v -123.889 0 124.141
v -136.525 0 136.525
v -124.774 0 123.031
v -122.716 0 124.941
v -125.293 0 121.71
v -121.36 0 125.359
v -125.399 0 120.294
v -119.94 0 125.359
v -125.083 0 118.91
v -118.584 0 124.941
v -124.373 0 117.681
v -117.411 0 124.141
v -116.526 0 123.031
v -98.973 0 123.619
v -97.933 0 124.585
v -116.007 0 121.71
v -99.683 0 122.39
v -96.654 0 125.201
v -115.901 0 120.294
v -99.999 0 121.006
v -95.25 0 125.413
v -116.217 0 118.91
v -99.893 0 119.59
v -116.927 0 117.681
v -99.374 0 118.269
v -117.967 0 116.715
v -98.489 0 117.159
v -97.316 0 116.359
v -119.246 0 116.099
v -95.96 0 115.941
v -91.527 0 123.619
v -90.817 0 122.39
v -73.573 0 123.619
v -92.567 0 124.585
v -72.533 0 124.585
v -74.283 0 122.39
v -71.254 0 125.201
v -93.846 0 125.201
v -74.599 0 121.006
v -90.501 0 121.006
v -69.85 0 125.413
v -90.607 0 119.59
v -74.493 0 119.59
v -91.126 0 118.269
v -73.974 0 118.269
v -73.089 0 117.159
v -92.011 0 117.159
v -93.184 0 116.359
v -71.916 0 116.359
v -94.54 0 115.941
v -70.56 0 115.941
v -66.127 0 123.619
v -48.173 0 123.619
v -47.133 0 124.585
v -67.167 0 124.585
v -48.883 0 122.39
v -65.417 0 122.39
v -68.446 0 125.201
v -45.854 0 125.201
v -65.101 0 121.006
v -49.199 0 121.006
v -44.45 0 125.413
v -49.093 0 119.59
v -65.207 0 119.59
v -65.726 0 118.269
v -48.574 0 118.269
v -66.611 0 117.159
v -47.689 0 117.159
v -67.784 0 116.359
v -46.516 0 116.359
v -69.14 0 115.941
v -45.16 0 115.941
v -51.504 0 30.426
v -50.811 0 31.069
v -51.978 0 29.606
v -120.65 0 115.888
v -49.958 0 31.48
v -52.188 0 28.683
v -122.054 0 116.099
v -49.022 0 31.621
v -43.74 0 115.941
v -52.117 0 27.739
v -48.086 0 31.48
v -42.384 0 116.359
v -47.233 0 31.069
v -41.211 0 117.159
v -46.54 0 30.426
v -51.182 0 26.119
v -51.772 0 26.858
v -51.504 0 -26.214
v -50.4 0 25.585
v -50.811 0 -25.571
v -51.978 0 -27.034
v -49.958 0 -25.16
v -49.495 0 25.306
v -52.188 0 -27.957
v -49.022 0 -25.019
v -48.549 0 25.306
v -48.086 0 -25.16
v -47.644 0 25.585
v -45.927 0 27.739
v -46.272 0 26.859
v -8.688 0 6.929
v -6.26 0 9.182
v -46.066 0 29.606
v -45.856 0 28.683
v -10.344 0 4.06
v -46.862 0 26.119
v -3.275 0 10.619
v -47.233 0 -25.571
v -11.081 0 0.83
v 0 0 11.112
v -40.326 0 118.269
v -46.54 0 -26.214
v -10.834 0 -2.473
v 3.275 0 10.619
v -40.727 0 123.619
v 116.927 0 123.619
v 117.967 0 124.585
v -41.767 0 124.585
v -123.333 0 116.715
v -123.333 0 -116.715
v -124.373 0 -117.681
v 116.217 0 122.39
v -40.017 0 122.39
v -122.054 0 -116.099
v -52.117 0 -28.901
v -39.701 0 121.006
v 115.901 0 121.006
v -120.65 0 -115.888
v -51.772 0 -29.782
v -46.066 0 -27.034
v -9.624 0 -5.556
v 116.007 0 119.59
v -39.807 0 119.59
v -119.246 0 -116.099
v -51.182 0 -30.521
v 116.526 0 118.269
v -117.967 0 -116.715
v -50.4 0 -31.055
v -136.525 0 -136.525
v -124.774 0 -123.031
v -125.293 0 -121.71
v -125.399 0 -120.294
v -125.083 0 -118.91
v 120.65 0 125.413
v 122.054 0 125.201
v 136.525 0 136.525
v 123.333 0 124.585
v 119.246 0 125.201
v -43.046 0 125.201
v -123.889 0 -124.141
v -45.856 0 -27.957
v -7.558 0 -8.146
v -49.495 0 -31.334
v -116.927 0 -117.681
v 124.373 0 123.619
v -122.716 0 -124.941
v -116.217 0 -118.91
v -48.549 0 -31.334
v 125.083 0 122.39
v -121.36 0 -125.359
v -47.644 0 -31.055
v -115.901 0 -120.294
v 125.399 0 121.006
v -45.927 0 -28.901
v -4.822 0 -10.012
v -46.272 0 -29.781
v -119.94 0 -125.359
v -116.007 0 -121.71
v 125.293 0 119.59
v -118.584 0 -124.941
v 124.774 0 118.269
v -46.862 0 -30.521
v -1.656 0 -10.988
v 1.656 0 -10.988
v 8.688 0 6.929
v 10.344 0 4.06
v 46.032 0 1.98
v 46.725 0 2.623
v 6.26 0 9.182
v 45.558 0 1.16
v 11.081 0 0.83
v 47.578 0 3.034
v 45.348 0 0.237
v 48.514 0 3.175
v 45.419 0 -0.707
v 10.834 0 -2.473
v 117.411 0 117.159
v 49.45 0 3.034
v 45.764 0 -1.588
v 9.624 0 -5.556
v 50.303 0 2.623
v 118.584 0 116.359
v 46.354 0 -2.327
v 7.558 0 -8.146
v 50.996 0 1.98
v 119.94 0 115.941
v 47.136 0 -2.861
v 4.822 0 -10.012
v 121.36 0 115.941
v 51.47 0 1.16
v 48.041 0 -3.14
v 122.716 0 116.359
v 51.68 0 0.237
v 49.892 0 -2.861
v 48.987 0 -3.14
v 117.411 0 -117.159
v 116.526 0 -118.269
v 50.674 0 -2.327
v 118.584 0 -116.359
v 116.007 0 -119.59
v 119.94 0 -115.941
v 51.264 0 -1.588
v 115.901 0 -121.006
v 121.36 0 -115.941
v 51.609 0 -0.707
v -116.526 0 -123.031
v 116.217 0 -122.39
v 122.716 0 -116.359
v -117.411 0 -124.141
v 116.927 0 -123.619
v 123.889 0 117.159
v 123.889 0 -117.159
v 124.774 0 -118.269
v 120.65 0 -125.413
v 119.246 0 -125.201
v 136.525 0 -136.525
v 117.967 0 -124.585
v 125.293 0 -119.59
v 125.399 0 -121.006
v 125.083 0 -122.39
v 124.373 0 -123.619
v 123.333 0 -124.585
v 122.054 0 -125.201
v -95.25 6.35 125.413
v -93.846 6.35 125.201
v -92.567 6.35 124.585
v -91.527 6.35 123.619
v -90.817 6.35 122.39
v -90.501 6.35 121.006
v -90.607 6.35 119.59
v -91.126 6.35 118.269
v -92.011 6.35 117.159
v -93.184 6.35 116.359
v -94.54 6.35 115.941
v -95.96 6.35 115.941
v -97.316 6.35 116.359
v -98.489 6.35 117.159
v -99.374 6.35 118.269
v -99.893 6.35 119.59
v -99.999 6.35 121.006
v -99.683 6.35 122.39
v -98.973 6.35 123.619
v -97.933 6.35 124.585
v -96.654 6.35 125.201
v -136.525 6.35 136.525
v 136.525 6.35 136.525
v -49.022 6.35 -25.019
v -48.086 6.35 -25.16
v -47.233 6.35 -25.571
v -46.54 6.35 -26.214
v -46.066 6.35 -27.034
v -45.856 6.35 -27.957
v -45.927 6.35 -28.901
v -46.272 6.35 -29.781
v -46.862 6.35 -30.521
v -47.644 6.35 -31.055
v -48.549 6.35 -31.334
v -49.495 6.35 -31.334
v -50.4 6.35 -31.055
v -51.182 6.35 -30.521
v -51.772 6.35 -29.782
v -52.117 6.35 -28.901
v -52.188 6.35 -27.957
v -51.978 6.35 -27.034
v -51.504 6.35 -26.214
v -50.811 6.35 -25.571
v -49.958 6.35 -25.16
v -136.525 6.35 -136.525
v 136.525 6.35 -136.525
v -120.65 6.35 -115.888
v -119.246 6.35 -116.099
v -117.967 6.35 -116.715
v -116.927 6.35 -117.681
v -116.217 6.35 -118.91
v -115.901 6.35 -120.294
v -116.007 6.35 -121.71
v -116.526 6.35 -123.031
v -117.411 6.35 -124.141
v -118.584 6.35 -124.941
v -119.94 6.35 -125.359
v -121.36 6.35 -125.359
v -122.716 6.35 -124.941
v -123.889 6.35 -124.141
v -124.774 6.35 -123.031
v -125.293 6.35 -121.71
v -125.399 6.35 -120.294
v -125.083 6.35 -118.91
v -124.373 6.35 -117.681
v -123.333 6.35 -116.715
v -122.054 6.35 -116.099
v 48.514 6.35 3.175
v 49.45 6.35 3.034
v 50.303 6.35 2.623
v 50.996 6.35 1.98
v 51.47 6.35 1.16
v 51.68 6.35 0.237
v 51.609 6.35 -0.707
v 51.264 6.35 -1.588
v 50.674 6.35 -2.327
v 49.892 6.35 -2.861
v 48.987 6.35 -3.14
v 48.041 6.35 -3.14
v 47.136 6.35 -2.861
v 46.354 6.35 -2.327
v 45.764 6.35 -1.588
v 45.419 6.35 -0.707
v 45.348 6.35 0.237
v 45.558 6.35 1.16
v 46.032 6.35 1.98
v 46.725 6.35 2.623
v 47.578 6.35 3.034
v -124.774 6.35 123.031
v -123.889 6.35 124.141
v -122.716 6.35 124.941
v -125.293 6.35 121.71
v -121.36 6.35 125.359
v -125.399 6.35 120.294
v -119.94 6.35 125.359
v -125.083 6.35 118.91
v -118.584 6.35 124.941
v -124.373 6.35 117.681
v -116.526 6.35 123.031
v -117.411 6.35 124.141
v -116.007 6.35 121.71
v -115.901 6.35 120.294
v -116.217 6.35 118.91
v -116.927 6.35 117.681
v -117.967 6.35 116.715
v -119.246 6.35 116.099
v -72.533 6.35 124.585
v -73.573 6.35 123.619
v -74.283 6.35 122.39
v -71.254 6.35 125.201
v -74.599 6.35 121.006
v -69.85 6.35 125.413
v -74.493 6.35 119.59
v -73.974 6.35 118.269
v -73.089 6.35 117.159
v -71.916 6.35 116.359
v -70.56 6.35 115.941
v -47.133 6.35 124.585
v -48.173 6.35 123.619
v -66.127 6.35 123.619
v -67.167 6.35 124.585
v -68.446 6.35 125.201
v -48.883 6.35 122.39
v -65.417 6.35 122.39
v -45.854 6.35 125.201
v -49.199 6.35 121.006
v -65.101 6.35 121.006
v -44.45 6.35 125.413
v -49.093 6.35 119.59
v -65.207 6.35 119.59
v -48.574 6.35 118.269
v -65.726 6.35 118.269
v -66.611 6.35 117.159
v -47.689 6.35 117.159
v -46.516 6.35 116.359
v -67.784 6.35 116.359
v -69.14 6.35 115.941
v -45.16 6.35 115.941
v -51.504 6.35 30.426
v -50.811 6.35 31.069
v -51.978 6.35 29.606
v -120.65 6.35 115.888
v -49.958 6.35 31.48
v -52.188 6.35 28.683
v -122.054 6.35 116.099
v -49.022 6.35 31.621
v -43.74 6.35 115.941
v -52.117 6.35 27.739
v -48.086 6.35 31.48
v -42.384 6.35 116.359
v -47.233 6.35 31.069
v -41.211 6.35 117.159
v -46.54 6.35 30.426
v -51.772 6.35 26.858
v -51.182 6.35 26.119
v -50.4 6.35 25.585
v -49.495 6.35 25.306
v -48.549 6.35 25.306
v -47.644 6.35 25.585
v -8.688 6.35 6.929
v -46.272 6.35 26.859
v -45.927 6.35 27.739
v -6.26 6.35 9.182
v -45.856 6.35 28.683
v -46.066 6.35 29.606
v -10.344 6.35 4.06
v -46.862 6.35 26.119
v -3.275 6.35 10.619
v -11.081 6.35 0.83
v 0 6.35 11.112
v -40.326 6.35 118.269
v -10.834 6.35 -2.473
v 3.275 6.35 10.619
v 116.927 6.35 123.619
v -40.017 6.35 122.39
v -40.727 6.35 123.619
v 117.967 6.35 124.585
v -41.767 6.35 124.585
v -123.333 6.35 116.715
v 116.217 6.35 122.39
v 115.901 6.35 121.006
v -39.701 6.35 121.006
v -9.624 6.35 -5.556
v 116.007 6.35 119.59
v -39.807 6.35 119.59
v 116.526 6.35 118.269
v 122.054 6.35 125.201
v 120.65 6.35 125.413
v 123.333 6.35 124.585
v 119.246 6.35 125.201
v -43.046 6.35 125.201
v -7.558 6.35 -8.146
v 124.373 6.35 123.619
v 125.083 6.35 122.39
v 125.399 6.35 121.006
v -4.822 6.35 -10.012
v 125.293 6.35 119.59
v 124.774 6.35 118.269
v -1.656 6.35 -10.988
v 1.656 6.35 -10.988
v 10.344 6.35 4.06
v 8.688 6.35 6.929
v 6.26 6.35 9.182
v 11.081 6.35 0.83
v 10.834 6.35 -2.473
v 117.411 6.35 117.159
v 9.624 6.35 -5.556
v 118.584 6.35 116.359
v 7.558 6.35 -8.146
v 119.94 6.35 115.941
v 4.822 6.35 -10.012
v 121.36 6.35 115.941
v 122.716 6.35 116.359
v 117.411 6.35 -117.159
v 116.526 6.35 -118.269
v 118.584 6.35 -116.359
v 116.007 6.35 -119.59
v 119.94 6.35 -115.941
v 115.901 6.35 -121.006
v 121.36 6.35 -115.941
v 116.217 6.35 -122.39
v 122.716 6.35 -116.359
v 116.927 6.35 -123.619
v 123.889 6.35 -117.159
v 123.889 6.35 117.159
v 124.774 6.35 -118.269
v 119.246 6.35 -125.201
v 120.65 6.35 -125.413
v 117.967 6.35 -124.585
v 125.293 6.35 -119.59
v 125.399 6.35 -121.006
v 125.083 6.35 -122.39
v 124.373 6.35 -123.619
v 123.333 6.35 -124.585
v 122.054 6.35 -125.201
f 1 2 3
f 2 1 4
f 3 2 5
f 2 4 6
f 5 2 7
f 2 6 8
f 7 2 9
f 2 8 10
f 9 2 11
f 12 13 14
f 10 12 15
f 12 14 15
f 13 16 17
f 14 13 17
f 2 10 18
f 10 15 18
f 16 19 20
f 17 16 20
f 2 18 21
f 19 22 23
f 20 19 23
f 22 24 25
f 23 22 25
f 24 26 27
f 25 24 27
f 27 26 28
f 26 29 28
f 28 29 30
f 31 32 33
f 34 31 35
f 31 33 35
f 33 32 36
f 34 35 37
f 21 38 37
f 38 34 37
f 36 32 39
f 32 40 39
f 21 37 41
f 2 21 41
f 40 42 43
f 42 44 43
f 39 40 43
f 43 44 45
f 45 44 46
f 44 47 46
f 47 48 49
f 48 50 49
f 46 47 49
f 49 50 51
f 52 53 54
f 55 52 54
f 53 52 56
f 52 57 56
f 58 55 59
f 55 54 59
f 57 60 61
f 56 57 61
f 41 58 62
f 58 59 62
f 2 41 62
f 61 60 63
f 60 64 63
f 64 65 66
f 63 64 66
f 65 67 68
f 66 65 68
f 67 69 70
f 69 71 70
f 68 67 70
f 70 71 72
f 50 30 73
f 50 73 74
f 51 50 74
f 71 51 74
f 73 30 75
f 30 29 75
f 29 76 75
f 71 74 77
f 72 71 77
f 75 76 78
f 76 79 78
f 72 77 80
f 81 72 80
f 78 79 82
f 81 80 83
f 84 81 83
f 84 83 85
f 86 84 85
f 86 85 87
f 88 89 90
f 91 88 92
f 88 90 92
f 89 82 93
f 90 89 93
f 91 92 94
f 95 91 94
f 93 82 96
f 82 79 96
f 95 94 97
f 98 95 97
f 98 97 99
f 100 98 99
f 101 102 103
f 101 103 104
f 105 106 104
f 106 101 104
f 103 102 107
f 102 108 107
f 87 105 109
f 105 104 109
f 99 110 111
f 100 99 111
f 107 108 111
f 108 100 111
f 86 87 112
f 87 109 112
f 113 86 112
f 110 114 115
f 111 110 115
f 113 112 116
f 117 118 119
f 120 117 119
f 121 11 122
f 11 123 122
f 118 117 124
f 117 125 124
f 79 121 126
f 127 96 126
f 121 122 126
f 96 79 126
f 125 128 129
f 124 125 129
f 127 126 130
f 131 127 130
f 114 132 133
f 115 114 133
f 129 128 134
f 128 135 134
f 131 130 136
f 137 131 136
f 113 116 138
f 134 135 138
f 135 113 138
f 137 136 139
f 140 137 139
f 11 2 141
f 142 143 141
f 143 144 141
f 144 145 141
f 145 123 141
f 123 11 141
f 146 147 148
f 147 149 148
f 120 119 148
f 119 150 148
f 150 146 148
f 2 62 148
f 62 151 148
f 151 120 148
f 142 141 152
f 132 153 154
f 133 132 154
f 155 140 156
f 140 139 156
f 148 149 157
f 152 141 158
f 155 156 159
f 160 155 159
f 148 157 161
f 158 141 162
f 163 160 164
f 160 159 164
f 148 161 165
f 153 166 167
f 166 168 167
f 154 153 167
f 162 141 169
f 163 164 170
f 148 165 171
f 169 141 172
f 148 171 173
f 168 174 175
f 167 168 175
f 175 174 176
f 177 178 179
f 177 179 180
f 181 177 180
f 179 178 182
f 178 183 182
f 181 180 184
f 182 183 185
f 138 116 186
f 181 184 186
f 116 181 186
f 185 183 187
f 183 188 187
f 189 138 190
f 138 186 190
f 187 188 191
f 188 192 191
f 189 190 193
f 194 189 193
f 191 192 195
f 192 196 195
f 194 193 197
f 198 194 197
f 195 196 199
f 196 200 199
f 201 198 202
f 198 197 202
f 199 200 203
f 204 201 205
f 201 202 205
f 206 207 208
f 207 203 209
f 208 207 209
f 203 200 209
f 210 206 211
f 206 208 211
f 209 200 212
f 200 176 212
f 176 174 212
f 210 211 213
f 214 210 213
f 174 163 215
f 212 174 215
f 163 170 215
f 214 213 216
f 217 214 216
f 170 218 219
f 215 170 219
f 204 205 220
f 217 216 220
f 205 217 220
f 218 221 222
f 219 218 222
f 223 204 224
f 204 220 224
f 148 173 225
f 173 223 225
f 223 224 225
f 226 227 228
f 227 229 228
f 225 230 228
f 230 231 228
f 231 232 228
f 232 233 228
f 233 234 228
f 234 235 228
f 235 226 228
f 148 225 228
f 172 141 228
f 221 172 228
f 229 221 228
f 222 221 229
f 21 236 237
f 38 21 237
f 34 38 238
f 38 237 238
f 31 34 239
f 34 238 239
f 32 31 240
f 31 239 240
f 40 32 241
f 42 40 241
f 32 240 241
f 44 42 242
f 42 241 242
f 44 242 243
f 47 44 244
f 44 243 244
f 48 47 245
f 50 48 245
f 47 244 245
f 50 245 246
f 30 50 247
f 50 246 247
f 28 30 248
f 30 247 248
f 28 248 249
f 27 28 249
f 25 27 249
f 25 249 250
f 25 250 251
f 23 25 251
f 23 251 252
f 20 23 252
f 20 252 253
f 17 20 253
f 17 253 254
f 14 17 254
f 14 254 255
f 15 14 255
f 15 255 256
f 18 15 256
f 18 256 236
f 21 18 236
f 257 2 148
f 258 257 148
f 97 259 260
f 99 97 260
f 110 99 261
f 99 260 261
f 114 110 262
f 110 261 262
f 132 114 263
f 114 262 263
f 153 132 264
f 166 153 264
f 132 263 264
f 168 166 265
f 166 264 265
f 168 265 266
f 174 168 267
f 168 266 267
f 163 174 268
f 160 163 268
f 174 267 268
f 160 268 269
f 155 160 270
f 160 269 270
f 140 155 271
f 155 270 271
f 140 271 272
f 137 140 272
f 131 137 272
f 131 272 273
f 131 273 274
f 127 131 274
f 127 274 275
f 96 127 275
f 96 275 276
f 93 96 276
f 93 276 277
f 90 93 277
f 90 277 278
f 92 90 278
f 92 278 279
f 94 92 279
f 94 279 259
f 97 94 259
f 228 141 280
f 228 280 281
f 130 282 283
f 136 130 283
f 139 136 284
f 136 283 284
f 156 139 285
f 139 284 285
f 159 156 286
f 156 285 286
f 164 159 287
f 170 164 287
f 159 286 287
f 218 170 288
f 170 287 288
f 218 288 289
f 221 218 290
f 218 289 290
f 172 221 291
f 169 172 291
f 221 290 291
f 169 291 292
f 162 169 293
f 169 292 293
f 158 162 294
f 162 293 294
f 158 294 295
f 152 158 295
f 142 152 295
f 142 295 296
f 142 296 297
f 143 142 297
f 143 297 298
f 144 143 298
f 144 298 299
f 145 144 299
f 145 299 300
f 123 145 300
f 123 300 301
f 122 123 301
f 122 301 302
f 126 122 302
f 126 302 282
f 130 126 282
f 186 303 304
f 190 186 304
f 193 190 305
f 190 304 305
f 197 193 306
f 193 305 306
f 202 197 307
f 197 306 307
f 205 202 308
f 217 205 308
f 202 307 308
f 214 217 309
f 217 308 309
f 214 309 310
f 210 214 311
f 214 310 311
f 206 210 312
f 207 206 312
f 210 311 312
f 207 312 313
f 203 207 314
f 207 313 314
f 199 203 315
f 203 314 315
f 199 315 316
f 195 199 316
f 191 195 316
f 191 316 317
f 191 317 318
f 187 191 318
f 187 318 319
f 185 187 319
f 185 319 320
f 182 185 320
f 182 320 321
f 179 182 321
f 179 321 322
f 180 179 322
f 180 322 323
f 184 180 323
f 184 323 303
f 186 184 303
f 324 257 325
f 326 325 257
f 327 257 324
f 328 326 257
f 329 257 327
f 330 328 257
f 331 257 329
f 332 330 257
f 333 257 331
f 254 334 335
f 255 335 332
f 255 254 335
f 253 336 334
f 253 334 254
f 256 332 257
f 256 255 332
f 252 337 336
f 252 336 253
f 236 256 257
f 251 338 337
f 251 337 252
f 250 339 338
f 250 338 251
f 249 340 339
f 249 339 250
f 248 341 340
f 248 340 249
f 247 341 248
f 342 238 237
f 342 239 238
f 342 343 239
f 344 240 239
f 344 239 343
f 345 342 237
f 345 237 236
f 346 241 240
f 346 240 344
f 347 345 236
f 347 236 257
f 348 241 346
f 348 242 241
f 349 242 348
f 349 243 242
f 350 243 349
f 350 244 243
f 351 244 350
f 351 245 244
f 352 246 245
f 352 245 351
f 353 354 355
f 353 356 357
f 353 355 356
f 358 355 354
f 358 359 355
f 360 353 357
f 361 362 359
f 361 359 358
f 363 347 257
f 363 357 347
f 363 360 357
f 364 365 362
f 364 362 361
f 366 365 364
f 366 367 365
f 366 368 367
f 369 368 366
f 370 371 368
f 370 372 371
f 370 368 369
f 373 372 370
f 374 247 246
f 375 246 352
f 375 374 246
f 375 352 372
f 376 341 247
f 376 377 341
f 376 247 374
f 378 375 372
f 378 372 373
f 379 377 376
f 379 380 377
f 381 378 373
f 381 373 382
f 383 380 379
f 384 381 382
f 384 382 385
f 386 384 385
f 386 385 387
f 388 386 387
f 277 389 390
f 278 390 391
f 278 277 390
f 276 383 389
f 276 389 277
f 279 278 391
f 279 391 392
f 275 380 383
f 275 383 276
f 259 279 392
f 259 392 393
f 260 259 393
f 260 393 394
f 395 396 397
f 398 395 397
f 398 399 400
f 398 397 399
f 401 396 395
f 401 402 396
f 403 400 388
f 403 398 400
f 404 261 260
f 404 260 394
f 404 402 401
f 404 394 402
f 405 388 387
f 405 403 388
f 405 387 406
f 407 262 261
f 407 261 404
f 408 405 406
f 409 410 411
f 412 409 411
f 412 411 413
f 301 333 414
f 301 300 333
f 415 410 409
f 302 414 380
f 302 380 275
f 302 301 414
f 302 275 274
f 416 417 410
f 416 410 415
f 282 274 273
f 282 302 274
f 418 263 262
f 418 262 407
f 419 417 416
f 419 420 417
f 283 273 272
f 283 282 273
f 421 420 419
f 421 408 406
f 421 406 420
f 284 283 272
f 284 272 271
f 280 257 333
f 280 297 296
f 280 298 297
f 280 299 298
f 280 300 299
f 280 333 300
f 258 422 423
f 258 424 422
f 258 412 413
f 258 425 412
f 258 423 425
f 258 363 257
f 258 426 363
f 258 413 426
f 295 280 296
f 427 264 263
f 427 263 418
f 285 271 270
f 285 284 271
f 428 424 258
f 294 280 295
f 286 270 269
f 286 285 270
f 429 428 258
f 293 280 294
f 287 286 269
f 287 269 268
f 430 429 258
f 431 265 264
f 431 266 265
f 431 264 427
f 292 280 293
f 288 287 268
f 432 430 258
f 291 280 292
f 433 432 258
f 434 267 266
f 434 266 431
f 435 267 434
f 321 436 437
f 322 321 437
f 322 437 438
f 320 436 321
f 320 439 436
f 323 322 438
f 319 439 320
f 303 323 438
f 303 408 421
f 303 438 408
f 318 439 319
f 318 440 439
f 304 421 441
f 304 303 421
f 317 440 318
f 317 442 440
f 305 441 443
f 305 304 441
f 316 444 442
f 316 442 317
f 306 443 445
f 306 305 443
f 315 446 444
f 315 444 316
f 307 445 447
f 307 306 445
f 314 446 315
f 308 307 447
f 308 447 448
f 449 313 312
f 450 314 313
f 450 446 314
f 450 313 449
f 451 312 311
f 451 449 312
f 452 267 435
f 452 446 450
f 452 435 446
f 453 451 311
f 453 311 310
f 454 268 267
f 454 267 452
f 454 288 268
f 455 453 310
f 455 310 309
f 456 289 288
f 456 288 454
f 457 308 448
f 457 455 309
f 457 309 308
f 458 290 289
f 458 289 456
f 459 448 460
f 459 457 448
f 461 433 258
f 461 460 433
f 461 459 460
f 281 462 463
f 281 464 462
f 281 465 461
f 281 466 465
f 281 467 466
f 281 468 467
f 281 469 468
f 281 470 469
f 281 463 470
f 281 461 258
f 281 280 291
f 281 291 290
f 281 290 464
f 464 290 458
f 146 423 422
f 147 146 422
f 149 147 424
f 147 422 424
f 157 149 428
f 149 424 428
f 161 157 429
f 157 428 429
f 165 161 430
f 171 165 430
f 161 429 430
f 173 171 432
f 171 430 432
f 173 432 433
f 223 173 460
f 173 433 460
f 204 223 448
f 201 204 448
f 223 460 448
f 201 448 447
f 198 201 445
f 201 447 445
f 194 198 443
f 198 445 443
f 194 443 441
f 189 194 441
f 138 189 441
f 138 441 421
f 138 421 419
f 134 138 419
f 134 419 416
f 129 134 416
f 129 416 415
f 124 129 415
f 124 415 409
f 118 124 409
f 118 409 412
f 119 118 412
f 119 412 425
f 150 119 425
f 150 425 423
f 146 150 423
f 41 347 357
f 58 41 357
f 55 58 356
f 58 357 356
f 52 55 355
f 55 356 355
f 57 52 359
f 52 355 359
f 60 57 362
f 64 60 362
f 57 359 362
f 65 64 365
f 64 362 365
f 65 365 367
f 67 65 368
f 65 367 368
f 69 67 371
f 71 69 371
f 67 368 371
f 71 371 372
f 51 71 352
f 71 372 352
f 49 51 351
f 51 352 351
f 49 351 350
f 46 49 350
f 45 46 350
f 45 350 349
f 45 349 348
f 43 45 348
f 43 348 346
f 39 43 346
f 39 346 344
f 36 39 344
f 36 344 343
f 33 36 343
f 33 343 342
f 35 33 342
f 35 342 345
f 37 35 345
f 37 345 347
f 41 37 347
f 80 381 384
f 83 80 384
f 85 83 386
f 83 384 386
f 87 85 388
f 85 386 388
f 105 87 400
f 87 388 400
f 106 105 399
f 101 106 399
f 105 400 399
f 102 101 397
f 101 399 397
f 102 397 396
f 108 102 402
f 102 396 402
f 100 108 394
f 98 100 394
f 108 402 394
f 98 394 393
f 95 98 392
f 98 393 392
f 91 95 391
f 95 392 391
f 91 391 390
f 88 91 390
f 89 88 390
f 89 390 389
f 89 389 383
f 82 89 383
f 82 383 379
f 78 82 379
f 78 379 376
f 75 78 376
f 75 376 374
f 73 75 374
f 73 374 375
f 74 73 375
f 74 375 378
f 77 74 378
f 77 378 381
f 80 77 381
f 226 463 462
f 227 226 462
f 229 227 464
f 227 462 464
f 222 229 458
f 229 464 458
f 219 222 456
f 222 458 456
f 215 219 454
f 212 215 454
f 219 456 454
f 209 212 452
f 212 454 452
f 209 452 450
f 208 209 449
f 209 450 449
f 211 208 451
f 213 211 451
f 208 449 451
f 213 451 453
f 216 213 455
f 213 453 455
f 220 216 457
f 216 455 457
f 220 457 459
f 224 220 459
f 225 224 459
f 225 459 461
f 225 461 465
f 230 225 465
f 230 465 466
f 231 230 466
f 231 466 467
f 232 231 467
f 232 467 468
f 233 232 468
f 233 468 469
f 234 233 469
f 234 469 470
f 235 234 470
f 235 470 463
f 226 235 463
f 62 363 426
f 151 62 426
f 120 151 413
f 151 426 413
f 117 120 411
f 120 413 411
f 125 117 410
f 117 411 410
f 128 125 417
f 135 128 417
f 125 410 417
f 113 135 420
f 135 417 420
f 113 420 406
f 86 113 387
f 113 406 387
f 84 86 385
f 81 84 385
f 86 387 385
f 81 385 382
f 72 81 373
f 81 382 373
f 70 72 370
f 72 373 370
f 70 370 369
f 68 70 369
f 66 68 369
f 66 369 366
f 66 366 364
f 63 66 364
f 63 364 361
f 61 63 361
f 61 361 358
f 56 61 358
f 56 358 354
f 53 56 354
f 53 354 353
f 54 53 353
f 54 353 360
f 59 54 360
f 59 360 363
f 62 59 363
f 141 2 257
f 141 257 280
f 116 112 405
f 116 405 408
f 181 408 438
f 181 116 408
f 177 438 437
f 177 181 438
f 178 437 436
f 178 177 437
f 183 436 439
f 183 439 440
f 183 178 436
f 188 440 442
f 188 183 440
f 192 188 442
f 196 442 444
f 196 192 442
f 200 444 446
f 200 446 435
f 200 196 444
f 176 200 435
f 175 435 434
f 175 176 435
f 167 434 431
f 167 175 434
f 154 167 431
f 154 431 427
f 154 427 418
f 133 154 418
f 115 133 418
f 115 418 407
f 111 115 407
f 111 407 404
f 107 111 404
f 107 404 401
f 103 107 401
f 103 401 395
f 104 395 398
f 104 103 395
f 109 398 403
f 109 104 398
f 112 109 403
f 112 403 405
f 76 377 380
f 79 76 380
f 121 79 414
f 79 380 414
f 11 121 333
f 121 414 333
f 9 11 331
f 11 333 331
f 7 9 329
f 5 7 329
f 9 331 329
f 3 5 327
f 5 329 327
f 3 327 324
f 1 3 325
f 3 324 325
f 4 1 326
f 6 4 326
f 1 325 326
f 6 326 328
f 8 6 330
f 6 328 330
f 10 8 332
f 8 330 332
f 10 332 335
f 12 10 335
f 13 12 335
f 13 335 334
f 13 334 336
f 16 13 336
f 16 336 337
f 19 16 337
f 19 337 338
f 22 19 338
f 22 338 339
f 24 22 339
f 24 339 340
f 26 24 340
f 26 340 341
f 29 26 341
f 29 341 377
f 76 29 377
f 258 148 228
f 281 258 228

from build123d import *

# Parameters (mm, degrees)
SKETCH1_W           = 273.05
SKETCH1_H           = 273.05
SKETCH1_R           = 11.1125
BOSS_EXTRUDE1_DEPTH = 6.35
SKETCH2_R           = 4.7625
CUT_EXTRUDE1_DEPTH  = 194.179899964
SKETCH3_R           = 3.175
CUT_EXTRUDE4_DEPTH  = 194.179899964


with BuildPart() as part:
    # Sketch1 → Boss-Extrude1 (new body)
    with BuildSketch(Plane(origin=(0, 0, 0), x_dir=(1, 0, 0), z_dir=(0, 1, 0))):
        Rectangle(SKETCH1_W, SKETCH1_H)
        with Locations(Location((0, 0, 0), (0, 0, 270))):
            Circle(SKETCH1_R, mode=Mode.SUBTRACT)
    extrude(amount=BOSS_EXTRUDE1_DEPTH)

    # Sketch2 → Cut-Extrude1 (cut, through all)
    with BuildSketch(Plane(origin=(0, 6.35, 0), x_dir=(-1, 0, 0), z_dir=(0, 1, 0))):
        with Locations(Location((120.65, -120.65, 0), (0, 0, 90))):
            Circle(SKETCH2_R)
        with Locations(Location((120.65, 120.65, 0), (0, 0, 270))):
            Circle(SKETCH2_R)
        with Locations(Location((-120.65, -120.65, 0), (0, 0, 270))):
            Circle(SKETCH2_R)
        with Locations(Location((-120.65, 120.65, 0), (0, 0, 90))):
            Circle(SKETCH2_R)
        with Locations(Location((95.25, 120.65, 0), (0, 0, 90))):
            Circle(SKETCH2_R)
        with Locations(Location((69.85, 120.65, 0), (0, 0, 90))):
            Circle(SKETCH2_R)
        with Locations(Location((44.45, 120.65, 0), (0, 0, 90))):
            Circle(SKETCH2_R)
    extrude(amount=-CUT_EXTRUDE1_DEPTH, mode=Mode.SUBTRACT)

    # Sketch3 → Cut-Extrude4 (cut, through all)
    with BuildSketch(Plane(origin=(0, 6.35, 0), x_dir=(-1, 0, 0), z_dir=(0, 1, 0))):
        with Locations(Location((49.022, -28.194, 0), (0, 0, 90))):
            Circle(SKETCH3_R)
        with Locations(Location((49.022, 28.446, 0), (0, 0, 90))):
            Circle(SKETCH3_R)
        with Locations(Location((-48.514, 0, 0), (0, 0, 90))):
            Circle(SKETCH3_R)
    extrude(amount=-CUT_EXTRUDE4_DEPTH, mode=Mode.SUBTRACT)


solid = part.part
